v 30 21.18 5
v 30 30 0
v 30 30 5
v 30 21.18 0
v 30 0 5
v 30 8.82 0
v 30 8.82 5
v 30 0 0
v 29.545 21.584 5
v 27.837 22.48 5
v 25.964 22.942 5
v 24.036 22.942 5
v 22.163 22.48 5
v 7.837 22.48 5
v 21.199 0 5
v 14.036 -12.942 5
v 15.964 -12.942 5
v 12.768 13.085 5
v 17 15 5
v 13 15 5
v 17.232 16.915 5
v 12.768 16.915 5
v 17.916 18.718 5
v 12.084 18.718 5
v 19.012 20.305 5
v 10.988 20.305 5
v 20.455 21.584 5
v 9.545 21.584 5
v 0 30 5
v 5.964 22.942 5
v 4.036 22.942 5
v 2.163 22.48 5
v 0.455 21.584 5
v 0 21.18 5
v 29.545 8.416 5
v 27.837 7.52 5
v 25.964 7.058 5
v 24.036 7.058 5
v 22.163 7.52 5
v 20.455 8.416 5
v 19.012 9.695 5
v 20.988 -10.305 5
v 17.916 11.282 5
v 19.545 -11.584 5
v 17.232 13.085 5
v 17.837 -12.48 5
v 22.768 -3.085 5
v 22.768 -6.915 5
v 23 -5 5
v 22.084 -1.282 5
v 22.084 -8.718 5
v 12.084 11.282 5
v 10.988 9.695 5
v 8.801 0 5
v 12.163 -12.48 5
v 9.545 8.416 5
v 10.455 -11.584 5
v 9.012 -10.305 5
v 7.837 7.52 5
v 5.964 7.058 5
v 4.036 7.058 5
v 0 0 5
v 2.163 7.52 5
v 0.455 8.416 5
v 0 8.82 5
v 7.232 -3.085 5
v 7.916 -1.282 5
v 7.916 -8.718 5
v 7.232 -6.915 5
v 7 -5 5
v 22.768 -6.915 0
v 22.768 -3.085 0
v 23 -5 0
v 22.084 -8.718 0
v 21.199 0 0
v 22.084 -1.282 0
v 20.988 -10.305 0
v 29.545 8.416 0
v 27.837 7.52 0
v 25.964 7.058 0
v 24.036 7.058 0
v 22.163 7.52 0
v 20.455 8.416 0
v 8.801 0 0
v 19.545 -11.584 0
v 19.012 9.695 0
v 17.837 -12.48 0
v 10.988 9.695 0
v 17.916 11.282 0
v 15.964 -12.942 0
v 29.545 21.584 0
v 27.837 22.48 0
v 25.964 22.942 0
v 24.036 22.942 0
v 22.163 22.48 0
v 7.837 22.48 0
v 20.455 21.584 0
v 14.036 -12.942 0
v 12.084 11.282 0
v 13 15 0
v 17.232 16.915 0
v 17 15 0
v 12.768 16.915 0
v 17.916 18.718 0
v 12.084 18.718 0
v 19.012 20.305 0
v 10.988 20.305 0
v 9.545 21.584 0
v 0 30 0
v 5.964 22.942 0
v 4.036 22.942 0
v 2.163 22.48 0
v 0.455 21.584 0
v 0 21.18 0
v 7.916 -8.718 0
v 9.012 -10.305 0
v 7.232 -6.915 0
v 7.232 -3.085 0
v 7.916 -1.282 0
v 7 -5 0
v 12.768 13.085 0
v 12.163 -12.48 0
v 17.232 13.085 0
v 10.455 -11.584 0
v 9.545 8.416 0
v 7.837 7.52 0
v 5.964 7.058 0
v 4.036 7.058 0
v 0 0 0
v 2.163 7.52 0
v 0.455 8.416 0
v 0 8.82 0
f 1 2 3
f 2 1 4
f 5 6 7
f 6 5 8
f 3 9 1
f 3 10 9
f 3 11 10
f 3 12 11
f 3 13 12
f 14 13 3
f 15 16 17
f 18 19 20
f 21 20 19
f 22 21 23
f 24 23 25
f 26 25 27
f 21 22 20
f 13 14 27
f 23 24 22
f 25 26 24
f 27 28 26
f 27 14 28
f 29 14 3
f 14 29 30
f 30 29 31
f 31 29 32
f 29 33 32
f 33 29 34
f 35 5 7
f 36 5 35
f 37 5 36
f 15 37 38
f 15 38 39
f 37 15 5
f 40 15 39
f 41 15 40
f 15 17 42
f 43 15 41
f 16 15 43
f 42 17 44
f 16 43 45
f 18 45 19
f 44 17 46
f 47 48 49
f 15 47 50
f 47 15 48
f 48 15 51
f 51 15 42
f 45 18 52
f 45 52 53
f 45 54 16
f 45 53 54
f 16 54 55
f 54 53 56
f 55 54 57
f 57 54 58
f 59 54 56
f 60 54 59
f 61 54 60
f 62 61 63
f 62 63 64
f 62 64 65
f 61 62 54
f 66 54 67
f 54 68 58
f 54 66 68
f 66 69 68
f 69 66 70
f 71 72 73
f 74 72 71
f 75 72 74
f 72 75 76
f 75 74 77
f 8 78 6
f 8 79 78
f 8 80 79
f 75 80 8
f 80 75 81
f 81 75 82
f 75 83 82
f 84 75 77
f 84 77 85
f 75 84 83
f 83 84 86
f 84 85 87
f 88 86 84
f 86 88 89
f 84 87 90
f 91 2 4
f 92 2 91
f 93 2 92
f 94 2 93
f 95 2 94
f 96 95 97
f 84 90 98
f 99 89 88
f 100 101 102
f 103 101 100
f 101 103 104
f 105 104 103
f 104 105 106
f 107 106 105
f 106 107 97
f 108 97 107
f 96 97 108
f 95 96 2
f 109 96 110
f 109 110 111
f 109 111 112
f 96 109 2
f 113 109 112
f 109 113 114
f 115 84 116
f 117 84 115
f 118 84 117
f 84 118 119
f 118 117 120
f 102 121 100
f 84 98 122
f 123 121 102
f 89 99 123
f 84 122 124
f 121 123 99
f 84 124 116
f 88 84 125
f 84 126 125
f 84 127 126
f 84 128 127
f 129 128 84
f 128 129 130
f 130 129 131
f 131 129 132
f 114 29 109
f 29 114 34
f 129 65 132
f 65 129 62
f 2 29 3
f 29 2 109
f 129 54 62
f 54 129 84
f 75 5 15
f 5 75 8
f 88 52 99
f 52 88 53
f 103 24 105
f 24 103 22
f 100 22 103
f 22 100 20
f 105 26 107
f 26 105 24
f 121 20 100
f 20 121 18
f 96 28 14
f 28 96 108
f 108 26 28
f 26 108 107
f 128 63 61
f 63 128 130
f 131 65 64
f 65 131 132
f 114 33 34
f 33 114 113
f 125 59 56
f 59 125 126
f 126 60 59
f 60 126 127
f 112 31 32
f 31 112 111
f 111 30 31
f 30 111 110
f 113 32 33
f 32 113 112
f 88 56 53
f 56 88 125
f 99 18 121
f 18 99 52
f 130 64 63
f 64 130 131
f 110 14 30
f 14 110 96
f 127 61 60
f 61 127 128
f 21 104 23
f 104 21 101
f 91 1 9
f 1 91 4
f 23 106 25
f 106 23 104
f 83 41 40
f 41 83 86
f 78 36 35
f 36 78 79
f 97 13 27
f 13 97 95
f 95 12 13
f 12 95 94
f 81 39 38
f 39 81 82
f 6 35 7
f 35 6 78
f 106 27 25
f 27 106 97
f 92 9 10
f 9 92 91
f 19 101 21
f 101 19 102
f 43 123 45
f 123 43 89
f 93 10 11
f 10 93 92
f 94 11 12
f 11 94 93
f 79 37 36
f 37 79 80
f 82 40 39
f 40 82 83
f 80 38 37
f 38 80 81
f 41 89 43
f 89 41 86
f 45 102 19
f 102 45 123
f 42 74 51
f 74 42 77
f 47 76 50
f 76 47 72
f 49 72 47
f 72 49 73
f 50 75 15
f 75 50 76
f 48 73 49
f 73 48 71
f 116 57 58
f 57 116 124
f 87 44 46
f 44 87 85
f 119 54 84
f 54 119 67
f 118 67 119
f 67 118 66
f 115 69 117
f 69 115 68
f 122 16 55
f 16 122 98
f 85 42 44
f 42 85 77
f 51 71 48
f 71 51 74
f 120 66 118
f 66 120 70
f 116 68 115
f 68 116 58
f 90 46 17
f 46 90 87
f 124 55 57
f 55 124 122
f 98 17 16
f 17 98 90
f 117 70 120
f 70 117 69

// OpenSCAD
//SODA LABS 25.07.2014 Loguncov Maxim
//12 штук


difference(){
cube([30,30,5,]);
translate([5,15,0])
cylinder(5,8,8);
translate([25,15,0])
cylinder(5,8,8);
}
translate([15,-5,0])
cylinder(5,8,8);
